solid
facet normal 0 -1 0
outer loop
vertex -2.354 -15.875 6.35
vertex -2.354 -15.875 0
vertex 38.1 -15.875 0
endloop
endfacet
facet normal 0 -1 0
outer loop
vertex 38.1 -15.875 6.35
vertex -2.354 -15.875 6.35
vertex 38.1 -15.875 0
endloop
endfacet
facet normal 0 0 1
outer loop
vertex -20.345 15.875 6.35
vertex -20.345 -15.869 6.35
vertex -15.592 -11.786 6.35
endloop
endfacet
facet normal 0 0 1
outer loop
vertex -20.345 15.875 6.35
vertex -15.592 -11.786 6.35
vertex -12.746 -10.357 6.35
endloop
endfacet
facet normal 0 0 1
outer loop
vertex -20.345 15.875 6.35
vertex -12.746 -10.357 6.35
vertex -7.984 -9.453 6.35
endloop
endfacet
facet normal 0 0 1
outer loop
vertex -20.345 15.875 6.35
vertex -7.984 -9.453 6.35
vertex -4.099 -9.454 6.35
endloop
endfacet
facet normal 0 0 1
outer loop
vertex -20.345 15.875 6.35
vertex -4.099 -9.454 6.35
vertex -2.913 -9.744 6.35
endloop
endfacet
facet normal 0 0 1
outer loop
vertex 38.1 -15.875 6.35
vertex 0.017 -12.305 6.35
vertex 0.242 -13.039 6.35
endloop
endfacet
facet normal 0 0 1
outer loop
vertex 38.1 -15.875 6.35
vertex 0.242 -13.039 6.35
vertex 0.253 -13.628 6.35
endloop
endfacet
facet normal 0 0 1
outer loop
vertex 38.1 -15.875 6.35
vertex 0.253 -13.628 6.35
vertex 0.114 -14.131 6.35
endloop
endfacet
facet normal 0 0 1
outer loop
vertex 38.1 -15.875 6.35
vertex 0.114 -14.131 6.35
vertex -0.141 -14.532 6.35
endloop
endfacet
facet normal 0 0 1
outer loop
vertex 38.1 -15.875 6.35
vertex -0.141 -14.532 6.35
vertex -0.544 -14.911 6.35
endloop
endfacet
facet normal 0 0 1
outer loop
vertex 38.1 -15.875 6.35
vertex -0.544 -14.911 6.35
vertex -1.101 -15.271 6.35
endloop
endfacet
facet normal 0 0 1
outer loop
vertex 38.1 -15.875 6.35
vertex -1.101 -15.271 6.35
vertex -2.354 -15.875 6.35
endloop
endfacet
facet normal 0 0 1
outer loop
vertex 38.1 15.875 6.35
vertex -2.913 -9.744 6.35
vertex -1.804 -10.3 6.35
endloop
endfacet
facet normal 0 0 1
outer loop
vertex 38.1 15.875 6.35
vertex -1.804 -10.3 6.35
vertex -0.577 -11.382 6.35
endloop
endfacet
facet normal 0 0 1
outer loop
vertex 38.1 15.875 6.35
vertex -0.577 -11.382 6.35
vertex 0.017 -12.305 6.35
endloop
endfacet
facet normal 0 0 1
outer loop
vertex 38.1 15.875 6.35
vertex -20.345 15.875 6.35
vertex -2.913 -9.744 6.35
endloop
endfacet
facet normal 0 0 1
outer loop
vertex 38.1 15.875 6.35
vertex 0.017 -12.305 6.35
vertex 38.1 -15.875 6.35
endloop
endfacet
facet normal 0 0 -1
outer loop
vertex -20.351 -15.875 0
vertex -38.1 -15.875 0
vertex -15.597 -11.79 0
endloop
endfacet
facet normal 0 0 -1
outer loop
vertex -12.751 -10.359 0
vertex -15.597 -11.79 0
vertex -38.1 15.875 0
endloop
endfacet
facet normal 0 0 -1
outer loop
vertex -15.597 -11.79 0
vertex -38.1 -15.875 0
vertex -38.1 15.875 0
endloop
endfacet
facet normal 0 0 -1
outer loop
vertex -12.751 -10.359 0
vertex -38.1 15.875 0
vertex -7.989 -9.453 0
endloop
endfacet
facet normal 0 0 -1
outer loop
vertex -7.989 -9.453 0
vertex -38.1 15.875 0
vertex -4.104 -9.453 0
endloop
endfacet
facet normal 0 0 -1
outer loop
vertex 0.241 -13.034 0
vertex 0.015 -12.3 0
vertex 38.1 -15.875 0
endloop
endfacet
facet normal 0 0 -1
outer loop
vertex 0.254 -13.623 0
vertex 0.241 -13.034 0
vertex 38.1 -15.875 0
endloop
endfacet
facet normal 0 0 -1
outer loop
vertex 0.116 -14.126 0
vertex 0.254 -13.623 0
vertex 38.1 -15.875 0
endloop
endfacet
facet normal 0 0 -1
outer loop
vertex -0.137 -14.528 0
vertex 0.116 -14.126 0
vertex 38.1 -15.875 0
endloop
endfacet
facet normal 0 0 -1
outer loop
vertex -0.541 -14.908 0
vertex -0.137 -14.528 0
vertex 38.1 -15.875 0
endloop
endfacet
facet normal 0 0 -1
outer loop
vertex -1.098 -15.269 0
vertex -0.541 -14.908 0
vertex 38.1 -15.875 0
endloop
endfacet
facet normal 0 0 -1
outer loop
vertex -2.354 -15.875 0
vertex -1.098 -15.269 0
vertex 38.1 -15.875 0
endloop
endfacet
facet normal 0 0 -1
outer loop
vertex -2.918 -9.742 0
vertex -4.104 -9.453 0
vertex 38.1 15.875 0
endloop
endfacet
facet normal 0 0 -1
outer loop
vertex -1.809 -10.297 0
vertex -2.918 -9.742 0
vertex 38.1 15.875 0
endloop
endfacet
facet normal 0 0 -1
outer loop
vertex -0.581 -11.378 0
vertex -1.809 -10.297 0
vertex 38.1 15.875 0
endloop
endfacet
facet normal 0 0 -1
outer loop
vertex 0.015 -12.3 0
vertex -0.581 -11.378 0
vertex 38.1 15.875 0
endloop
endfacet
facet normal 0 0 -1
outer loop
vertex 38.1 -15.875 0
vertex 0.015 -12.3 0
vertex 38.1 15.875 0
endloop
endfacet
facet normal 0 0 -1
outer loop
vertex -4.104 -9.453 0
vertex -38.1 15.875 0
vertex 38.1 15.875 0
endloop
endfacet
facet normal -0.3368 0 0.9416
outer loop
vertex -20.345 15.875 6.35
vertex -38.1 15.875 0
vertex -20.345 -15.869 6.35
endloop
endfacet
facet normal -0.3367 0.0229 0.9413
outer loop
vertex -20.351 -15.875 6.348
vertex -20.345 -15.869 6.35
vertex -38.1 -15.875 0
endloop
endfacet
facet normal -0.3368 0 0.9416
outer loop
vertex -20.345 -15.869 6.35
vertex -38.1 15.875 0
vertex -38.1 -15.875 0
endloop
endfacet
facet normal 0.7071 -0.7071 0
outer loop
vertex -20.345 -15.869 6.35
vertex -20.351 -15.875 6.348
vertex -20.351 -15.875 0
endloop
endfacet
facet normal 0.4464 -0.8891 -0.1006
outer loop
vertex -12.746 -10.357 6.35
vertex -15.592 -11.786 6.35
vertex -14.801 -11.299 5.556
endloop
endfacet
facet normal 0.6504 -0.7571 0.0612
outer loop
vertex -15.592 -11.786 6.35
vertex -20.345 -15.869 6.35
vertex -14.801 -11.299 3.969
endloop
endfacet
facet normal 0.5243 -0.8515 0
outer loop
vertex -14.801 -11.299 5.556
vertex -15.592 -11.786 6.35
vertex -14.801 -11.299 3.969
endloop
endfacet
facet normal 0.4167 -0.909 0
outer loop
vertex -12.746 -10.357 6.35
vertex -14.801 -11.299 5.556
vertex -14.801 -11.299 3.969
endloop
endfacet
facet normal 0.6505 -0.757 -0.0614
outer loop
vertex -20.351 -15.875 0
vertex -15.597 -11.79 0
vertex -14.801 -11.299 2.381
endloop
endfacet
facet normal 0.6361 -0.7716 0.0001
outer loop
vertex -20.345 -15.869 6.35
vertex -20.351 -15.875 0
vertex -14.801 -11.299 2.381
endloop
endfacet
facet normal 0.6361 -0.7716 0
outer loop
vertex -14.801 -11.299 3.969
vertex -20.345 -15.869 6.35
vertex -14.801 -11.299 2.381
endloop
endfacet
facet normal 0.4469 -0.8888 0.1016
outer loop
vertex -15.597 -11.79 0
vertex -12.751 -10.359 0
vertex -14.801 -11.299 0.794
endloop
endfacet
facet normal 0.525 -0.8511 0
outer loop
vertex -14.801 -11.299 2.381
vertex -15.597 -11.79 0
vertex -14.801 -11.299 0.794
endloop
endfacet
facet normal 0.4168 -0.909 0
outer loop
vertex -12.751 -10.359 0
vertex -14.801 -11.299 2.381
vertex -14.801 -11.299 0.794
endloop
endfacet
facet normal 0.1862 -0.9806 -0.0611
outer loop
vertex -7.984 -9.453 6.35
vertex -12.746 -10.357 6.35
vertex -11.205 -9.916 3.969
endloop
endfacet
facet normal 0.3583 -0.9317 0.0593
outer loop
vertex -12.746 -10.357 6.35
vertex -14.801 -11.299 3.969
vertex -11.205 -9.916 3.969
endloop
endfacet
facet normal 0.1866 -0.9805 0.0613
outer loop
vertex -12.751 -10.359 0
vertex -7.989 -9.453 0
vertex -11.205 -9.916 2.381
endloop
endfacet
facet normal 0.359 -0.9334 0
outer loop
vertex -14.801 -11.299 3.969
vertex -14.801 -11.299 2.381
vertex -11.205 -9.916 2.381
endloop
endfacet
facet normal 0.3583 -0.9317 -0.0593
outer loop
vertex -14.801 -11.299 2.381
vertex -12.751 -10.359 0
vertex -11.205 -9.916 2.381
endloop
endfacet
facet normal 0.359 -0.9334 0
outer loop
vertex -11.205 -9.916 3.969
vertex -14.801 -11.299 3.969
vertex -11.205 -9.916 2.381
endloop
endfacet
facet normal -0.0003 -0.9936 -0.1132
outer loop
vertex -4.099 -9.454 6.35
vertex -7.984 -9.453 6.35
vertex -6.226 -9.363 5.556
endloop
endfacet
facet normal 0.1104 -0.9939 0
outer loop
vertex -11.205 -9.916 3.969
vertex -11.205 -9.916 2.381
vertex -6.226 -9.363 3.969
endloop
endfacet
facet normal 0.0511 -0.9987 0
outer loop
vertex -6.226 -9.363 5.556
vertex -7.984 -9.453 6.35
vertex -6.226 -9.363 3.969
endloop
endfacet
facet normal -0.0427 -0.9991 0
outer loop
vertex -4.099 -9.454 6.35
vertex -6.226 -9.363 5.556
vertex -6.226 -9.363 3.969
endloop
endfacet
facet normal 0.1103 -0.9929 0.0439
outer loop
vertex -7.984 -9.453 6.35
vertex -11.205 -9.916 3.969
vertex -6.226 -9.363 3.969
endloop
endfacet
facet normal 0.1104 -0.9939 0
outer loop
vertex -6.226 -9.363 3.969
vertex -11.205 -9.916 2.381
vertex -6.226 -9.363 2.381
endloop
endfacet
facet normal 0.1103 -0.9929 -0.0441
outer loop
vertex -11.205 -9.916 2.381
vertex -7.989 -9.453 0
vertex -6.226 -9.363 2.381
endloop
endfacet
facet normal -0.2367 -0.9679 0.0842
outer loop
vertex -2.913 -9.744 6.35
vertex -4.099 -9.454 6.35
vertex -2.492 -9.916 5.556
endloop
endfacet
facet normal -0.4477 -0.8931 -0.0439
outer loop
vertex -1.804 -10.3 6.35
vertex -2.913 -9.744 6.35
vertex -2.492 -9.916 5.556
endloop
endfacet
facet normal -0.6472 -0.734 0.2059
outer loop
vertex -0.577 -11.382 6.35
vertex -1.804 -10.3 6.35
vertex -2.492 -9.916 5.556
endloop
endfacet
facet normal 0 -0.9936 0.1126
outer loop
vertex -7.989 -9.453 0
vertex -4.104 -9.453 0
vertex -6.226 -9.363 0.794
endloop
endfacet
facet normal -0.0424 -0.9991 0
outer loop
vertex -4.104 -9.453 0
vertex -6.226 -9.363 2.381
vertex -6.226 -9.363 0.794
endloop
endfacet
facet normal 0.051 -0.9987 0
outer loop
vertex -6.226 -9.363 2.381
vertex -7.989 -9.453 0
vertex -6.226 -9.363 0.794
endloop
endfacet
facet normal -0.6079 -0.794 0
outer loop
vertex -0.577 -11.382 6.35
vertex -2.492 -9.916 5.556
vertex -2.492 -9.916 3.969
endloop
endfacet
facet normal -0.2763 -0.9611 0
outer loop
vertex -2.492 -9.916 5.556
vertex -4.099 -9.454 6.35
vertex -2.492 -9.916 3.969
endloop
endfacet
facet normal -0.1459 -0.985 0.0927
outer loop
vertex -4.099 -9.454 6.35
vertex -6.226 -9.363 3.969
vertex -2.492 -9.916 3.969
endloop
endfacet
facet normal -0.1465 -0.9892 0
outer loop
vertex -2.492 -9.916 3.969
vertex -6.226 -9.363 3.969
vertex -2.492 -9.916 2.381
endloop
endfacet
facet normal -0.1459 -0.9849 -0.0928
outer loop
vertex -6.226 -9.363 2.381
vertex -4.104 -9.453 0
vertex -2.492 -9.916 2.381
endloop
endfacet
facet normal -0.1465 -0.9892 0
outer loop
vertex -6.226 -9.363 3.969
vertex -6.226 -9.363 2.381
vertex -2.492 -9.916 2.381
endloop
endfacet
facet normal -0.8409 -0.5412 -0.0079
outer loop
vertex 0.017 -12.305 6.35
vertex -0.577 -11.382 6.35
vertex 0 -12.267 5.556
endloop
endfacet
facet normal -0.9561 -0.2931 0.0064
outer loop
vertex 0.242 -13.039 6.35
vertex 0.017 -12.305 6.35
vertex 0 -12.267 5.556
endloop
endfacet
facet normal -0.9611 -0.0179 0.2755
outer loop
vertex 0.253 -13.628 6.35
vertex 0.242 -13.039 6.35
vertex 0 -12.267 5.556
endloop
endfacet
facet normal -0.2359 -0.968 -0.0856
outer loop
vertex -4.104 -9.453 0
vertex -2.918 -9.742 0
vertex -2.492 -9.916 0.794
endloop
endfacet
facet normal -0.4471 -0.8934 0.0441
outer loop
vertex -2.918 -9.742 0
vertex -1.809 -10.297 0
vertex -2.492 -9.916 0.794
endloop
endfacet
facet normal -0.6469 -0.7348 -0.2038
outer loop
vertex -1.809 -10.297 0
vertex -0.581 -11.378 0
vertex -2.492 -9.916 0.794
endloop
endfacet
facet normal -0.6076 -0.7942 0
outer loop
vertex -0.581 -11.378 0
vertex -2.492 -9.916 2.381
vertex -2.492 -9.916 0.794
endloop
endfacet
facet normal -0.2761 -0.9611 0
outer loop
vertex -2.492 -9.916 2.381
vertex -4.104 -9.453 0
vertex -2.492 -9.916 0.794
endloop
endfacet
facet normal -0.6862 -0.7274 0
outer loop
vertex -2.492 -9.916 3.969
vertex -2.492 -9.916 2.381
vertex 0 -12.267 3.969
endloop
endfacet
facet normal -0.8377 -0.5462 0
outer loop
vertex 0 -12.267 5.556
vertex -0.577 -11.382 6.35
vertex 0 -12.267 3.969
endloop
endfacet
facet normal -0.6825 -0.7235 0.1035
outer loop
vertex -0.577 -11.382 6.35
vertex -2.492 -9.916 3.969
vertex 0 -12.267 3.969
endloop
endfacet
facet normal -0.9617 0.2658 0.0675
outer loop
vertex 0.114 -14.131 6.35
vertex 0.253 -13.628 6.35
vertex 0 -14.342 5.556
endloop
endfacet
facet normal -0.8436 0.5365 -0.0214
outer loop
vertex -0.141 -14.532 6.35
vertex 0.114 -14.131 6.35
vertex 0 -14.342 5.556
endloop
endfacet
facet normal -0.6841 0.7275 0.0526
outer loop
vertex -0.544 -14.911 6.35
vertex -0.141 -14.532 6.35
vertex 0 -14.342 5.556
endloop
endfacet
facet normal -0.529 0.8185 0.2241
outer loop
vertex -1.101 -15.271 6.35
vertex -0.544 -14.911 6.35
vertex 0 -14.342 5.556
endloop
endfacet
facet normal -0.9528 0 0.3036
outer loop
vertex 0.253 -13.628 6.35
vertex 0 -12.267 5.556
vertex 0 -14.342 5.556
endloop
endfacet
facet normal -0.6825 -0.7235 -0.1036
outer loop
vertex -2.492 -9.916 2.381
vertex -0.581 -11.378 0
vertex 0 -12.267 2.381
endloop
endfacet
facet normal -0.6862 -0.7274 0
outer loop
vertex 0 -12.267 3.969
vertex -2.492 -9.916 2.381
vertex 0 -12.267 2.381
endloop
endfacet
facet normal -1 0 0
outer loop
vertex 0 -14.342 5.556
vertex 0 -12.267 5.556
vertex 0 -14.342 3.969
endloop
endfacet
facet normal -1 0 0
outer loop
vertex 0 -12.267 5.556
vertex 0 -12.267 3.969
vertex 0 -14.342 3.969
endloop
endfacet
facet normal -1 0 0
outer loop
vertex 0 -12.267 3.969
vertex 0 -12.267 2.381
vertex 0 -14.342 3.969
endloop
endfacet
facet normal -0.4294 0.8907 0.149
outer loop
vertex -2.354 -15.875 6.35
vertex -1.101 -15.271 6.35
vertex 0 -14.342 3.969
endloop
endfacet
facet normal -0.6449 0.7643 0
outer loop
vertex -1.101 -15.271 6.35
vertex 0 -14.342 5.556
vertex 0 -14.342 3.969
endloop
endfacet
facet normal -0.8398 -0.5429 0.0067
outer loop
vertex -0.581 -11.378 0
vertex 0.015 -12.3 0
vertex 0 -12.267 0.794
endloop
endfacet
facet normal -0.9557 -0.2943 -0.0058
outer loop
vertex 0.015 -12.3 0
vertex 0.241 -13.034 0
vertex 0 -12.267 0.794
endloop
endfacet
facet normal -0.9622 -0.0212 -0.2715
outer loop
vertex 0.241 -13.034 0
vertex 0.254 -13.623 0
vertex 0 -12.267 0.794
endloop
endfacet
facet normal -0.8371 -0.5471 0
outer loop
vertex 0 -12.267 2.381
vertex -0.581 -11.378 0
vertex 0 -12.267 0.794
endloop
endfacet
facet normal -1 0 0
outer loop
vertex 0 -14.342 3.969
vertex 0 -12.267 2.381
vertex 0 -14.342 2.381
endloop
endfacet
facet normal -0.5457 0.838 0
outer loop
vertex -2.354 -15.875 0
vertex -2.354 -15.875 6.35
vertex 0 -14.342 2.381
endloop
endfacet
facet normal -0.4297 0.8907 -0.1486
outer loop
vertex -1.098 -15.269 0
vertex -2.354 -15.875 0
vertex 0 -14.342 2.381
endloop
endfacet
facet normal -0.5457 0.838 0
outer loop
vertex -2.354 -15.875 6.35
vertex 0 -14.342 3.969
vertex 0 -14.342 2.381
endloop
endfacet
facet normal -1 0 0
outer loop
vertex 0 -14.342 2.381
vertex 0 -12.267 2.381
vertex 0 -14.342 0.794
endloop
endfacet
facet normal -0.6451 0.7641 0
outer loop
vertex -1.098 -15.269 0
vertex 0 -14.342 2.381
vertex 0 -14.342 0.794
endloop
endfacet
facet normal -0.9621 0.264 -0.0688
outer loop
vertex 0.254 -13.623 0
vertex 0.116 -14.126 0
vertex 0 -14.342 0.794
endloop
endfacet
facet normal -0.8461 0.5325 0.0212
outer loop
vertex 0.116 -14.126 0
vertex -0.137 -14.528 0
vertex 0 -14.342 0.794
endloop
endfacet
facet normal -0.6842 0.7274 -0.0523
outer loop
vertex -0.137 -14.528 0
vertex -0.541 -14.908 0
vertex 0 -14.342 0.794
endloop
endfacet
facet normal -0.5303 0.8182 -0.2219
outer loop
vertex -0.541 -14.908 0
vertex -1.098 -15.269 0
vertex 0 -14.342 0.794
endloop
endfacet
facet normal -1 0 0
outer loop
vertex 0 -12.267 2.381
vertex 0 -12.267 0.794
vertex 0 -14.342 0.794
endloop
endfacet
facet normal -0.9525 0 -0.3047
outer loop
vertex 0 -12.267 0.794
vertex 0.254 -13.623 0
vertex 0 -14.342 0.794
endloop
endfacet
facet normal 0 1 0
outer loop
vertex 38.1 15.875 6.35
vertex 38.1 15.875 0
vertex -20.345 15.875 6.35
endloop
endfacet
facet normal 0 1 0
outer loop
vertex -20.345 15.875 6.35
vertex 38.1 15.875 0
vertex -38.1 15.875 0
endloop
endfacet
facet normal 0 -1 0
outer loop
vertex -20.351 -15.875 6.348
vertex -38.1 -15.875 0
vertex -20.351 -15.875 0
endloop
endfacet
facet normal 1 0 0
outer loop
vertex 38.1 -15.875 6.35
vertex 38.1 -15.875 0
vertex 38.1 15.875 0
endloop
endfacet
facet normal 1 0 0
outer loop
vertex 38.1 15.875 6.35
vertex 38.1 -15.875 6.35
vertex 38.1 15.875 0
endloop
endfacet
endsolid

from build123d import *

# Parameters (mm, degrees)
F1_DEPTH = 6.35
F2_SIZE2 = 6.34999
F2_SIZE  = 17.75459


# Not quite as in the source:
# - a fillet or chamfer is up to 0.001 mm smaller than in the source, because OpenCascade refuses the exact size


with BuildPart() as f1:
    # F0 (on Top) → F1 (new body)
    with BuildSketch(Plane.XY):
        with BuildLine():
            Line((38.1, 15.875), (-38.1, 15.875))
            Line((-38.1, 15.875), (-38.1, -15.875))
            Line((-38.1, -15.875), (-20.3513801098, -15.875))
            add(Edge.make_bspline(
                [(-20.3513801098, -15.875), (-19.5442600635, -15.0806070794), (-17.8938059161, -13.4561782272), (-14.8392122853, -11.1202028199), (-11.2582679077, -9.7102875395), (-6.2422908773, -9.2564413312), (-2.450482189, -9.4578887631), (0.3163590299, -12.0282683935), (0.3966126589, -14.6462649088), (-1.3919718956, -15.4452723731), (-2.3539206013, -15.875)],
                knots=[0, 0, 0, 0, 0.1245260011, 0.2546392645, 0.3863068952, 0.5364470911, 0.6667795698, 0.7909479354, 0.8875661973, 1, 1, 1, 1], degree=3))
            Line((-2.3539206013, -15.875), (38.1, -15.875))
            Line((38.1, -15.875), (38.1, 15.875))
        make_face()
    extrude(amount=F1_DEPTH)

    # F2 (size 17.7546 and 6.35 in the source; OpenCascade refuses exactly that, so slightly less here)
    f2_edges = [f1.edges().sort_by_distance(p)[0] for p in [
        (-38.1, 0, 6.35),
    ]]
    f2_side = f1.faces().sort_by_distance((0.37676, 0.562053, 6.35))[0]
    chamfer(f2_edges, length=F2_SIZE, length2=F2_SIZE2, reference=f2_side)


solid = f1.part
